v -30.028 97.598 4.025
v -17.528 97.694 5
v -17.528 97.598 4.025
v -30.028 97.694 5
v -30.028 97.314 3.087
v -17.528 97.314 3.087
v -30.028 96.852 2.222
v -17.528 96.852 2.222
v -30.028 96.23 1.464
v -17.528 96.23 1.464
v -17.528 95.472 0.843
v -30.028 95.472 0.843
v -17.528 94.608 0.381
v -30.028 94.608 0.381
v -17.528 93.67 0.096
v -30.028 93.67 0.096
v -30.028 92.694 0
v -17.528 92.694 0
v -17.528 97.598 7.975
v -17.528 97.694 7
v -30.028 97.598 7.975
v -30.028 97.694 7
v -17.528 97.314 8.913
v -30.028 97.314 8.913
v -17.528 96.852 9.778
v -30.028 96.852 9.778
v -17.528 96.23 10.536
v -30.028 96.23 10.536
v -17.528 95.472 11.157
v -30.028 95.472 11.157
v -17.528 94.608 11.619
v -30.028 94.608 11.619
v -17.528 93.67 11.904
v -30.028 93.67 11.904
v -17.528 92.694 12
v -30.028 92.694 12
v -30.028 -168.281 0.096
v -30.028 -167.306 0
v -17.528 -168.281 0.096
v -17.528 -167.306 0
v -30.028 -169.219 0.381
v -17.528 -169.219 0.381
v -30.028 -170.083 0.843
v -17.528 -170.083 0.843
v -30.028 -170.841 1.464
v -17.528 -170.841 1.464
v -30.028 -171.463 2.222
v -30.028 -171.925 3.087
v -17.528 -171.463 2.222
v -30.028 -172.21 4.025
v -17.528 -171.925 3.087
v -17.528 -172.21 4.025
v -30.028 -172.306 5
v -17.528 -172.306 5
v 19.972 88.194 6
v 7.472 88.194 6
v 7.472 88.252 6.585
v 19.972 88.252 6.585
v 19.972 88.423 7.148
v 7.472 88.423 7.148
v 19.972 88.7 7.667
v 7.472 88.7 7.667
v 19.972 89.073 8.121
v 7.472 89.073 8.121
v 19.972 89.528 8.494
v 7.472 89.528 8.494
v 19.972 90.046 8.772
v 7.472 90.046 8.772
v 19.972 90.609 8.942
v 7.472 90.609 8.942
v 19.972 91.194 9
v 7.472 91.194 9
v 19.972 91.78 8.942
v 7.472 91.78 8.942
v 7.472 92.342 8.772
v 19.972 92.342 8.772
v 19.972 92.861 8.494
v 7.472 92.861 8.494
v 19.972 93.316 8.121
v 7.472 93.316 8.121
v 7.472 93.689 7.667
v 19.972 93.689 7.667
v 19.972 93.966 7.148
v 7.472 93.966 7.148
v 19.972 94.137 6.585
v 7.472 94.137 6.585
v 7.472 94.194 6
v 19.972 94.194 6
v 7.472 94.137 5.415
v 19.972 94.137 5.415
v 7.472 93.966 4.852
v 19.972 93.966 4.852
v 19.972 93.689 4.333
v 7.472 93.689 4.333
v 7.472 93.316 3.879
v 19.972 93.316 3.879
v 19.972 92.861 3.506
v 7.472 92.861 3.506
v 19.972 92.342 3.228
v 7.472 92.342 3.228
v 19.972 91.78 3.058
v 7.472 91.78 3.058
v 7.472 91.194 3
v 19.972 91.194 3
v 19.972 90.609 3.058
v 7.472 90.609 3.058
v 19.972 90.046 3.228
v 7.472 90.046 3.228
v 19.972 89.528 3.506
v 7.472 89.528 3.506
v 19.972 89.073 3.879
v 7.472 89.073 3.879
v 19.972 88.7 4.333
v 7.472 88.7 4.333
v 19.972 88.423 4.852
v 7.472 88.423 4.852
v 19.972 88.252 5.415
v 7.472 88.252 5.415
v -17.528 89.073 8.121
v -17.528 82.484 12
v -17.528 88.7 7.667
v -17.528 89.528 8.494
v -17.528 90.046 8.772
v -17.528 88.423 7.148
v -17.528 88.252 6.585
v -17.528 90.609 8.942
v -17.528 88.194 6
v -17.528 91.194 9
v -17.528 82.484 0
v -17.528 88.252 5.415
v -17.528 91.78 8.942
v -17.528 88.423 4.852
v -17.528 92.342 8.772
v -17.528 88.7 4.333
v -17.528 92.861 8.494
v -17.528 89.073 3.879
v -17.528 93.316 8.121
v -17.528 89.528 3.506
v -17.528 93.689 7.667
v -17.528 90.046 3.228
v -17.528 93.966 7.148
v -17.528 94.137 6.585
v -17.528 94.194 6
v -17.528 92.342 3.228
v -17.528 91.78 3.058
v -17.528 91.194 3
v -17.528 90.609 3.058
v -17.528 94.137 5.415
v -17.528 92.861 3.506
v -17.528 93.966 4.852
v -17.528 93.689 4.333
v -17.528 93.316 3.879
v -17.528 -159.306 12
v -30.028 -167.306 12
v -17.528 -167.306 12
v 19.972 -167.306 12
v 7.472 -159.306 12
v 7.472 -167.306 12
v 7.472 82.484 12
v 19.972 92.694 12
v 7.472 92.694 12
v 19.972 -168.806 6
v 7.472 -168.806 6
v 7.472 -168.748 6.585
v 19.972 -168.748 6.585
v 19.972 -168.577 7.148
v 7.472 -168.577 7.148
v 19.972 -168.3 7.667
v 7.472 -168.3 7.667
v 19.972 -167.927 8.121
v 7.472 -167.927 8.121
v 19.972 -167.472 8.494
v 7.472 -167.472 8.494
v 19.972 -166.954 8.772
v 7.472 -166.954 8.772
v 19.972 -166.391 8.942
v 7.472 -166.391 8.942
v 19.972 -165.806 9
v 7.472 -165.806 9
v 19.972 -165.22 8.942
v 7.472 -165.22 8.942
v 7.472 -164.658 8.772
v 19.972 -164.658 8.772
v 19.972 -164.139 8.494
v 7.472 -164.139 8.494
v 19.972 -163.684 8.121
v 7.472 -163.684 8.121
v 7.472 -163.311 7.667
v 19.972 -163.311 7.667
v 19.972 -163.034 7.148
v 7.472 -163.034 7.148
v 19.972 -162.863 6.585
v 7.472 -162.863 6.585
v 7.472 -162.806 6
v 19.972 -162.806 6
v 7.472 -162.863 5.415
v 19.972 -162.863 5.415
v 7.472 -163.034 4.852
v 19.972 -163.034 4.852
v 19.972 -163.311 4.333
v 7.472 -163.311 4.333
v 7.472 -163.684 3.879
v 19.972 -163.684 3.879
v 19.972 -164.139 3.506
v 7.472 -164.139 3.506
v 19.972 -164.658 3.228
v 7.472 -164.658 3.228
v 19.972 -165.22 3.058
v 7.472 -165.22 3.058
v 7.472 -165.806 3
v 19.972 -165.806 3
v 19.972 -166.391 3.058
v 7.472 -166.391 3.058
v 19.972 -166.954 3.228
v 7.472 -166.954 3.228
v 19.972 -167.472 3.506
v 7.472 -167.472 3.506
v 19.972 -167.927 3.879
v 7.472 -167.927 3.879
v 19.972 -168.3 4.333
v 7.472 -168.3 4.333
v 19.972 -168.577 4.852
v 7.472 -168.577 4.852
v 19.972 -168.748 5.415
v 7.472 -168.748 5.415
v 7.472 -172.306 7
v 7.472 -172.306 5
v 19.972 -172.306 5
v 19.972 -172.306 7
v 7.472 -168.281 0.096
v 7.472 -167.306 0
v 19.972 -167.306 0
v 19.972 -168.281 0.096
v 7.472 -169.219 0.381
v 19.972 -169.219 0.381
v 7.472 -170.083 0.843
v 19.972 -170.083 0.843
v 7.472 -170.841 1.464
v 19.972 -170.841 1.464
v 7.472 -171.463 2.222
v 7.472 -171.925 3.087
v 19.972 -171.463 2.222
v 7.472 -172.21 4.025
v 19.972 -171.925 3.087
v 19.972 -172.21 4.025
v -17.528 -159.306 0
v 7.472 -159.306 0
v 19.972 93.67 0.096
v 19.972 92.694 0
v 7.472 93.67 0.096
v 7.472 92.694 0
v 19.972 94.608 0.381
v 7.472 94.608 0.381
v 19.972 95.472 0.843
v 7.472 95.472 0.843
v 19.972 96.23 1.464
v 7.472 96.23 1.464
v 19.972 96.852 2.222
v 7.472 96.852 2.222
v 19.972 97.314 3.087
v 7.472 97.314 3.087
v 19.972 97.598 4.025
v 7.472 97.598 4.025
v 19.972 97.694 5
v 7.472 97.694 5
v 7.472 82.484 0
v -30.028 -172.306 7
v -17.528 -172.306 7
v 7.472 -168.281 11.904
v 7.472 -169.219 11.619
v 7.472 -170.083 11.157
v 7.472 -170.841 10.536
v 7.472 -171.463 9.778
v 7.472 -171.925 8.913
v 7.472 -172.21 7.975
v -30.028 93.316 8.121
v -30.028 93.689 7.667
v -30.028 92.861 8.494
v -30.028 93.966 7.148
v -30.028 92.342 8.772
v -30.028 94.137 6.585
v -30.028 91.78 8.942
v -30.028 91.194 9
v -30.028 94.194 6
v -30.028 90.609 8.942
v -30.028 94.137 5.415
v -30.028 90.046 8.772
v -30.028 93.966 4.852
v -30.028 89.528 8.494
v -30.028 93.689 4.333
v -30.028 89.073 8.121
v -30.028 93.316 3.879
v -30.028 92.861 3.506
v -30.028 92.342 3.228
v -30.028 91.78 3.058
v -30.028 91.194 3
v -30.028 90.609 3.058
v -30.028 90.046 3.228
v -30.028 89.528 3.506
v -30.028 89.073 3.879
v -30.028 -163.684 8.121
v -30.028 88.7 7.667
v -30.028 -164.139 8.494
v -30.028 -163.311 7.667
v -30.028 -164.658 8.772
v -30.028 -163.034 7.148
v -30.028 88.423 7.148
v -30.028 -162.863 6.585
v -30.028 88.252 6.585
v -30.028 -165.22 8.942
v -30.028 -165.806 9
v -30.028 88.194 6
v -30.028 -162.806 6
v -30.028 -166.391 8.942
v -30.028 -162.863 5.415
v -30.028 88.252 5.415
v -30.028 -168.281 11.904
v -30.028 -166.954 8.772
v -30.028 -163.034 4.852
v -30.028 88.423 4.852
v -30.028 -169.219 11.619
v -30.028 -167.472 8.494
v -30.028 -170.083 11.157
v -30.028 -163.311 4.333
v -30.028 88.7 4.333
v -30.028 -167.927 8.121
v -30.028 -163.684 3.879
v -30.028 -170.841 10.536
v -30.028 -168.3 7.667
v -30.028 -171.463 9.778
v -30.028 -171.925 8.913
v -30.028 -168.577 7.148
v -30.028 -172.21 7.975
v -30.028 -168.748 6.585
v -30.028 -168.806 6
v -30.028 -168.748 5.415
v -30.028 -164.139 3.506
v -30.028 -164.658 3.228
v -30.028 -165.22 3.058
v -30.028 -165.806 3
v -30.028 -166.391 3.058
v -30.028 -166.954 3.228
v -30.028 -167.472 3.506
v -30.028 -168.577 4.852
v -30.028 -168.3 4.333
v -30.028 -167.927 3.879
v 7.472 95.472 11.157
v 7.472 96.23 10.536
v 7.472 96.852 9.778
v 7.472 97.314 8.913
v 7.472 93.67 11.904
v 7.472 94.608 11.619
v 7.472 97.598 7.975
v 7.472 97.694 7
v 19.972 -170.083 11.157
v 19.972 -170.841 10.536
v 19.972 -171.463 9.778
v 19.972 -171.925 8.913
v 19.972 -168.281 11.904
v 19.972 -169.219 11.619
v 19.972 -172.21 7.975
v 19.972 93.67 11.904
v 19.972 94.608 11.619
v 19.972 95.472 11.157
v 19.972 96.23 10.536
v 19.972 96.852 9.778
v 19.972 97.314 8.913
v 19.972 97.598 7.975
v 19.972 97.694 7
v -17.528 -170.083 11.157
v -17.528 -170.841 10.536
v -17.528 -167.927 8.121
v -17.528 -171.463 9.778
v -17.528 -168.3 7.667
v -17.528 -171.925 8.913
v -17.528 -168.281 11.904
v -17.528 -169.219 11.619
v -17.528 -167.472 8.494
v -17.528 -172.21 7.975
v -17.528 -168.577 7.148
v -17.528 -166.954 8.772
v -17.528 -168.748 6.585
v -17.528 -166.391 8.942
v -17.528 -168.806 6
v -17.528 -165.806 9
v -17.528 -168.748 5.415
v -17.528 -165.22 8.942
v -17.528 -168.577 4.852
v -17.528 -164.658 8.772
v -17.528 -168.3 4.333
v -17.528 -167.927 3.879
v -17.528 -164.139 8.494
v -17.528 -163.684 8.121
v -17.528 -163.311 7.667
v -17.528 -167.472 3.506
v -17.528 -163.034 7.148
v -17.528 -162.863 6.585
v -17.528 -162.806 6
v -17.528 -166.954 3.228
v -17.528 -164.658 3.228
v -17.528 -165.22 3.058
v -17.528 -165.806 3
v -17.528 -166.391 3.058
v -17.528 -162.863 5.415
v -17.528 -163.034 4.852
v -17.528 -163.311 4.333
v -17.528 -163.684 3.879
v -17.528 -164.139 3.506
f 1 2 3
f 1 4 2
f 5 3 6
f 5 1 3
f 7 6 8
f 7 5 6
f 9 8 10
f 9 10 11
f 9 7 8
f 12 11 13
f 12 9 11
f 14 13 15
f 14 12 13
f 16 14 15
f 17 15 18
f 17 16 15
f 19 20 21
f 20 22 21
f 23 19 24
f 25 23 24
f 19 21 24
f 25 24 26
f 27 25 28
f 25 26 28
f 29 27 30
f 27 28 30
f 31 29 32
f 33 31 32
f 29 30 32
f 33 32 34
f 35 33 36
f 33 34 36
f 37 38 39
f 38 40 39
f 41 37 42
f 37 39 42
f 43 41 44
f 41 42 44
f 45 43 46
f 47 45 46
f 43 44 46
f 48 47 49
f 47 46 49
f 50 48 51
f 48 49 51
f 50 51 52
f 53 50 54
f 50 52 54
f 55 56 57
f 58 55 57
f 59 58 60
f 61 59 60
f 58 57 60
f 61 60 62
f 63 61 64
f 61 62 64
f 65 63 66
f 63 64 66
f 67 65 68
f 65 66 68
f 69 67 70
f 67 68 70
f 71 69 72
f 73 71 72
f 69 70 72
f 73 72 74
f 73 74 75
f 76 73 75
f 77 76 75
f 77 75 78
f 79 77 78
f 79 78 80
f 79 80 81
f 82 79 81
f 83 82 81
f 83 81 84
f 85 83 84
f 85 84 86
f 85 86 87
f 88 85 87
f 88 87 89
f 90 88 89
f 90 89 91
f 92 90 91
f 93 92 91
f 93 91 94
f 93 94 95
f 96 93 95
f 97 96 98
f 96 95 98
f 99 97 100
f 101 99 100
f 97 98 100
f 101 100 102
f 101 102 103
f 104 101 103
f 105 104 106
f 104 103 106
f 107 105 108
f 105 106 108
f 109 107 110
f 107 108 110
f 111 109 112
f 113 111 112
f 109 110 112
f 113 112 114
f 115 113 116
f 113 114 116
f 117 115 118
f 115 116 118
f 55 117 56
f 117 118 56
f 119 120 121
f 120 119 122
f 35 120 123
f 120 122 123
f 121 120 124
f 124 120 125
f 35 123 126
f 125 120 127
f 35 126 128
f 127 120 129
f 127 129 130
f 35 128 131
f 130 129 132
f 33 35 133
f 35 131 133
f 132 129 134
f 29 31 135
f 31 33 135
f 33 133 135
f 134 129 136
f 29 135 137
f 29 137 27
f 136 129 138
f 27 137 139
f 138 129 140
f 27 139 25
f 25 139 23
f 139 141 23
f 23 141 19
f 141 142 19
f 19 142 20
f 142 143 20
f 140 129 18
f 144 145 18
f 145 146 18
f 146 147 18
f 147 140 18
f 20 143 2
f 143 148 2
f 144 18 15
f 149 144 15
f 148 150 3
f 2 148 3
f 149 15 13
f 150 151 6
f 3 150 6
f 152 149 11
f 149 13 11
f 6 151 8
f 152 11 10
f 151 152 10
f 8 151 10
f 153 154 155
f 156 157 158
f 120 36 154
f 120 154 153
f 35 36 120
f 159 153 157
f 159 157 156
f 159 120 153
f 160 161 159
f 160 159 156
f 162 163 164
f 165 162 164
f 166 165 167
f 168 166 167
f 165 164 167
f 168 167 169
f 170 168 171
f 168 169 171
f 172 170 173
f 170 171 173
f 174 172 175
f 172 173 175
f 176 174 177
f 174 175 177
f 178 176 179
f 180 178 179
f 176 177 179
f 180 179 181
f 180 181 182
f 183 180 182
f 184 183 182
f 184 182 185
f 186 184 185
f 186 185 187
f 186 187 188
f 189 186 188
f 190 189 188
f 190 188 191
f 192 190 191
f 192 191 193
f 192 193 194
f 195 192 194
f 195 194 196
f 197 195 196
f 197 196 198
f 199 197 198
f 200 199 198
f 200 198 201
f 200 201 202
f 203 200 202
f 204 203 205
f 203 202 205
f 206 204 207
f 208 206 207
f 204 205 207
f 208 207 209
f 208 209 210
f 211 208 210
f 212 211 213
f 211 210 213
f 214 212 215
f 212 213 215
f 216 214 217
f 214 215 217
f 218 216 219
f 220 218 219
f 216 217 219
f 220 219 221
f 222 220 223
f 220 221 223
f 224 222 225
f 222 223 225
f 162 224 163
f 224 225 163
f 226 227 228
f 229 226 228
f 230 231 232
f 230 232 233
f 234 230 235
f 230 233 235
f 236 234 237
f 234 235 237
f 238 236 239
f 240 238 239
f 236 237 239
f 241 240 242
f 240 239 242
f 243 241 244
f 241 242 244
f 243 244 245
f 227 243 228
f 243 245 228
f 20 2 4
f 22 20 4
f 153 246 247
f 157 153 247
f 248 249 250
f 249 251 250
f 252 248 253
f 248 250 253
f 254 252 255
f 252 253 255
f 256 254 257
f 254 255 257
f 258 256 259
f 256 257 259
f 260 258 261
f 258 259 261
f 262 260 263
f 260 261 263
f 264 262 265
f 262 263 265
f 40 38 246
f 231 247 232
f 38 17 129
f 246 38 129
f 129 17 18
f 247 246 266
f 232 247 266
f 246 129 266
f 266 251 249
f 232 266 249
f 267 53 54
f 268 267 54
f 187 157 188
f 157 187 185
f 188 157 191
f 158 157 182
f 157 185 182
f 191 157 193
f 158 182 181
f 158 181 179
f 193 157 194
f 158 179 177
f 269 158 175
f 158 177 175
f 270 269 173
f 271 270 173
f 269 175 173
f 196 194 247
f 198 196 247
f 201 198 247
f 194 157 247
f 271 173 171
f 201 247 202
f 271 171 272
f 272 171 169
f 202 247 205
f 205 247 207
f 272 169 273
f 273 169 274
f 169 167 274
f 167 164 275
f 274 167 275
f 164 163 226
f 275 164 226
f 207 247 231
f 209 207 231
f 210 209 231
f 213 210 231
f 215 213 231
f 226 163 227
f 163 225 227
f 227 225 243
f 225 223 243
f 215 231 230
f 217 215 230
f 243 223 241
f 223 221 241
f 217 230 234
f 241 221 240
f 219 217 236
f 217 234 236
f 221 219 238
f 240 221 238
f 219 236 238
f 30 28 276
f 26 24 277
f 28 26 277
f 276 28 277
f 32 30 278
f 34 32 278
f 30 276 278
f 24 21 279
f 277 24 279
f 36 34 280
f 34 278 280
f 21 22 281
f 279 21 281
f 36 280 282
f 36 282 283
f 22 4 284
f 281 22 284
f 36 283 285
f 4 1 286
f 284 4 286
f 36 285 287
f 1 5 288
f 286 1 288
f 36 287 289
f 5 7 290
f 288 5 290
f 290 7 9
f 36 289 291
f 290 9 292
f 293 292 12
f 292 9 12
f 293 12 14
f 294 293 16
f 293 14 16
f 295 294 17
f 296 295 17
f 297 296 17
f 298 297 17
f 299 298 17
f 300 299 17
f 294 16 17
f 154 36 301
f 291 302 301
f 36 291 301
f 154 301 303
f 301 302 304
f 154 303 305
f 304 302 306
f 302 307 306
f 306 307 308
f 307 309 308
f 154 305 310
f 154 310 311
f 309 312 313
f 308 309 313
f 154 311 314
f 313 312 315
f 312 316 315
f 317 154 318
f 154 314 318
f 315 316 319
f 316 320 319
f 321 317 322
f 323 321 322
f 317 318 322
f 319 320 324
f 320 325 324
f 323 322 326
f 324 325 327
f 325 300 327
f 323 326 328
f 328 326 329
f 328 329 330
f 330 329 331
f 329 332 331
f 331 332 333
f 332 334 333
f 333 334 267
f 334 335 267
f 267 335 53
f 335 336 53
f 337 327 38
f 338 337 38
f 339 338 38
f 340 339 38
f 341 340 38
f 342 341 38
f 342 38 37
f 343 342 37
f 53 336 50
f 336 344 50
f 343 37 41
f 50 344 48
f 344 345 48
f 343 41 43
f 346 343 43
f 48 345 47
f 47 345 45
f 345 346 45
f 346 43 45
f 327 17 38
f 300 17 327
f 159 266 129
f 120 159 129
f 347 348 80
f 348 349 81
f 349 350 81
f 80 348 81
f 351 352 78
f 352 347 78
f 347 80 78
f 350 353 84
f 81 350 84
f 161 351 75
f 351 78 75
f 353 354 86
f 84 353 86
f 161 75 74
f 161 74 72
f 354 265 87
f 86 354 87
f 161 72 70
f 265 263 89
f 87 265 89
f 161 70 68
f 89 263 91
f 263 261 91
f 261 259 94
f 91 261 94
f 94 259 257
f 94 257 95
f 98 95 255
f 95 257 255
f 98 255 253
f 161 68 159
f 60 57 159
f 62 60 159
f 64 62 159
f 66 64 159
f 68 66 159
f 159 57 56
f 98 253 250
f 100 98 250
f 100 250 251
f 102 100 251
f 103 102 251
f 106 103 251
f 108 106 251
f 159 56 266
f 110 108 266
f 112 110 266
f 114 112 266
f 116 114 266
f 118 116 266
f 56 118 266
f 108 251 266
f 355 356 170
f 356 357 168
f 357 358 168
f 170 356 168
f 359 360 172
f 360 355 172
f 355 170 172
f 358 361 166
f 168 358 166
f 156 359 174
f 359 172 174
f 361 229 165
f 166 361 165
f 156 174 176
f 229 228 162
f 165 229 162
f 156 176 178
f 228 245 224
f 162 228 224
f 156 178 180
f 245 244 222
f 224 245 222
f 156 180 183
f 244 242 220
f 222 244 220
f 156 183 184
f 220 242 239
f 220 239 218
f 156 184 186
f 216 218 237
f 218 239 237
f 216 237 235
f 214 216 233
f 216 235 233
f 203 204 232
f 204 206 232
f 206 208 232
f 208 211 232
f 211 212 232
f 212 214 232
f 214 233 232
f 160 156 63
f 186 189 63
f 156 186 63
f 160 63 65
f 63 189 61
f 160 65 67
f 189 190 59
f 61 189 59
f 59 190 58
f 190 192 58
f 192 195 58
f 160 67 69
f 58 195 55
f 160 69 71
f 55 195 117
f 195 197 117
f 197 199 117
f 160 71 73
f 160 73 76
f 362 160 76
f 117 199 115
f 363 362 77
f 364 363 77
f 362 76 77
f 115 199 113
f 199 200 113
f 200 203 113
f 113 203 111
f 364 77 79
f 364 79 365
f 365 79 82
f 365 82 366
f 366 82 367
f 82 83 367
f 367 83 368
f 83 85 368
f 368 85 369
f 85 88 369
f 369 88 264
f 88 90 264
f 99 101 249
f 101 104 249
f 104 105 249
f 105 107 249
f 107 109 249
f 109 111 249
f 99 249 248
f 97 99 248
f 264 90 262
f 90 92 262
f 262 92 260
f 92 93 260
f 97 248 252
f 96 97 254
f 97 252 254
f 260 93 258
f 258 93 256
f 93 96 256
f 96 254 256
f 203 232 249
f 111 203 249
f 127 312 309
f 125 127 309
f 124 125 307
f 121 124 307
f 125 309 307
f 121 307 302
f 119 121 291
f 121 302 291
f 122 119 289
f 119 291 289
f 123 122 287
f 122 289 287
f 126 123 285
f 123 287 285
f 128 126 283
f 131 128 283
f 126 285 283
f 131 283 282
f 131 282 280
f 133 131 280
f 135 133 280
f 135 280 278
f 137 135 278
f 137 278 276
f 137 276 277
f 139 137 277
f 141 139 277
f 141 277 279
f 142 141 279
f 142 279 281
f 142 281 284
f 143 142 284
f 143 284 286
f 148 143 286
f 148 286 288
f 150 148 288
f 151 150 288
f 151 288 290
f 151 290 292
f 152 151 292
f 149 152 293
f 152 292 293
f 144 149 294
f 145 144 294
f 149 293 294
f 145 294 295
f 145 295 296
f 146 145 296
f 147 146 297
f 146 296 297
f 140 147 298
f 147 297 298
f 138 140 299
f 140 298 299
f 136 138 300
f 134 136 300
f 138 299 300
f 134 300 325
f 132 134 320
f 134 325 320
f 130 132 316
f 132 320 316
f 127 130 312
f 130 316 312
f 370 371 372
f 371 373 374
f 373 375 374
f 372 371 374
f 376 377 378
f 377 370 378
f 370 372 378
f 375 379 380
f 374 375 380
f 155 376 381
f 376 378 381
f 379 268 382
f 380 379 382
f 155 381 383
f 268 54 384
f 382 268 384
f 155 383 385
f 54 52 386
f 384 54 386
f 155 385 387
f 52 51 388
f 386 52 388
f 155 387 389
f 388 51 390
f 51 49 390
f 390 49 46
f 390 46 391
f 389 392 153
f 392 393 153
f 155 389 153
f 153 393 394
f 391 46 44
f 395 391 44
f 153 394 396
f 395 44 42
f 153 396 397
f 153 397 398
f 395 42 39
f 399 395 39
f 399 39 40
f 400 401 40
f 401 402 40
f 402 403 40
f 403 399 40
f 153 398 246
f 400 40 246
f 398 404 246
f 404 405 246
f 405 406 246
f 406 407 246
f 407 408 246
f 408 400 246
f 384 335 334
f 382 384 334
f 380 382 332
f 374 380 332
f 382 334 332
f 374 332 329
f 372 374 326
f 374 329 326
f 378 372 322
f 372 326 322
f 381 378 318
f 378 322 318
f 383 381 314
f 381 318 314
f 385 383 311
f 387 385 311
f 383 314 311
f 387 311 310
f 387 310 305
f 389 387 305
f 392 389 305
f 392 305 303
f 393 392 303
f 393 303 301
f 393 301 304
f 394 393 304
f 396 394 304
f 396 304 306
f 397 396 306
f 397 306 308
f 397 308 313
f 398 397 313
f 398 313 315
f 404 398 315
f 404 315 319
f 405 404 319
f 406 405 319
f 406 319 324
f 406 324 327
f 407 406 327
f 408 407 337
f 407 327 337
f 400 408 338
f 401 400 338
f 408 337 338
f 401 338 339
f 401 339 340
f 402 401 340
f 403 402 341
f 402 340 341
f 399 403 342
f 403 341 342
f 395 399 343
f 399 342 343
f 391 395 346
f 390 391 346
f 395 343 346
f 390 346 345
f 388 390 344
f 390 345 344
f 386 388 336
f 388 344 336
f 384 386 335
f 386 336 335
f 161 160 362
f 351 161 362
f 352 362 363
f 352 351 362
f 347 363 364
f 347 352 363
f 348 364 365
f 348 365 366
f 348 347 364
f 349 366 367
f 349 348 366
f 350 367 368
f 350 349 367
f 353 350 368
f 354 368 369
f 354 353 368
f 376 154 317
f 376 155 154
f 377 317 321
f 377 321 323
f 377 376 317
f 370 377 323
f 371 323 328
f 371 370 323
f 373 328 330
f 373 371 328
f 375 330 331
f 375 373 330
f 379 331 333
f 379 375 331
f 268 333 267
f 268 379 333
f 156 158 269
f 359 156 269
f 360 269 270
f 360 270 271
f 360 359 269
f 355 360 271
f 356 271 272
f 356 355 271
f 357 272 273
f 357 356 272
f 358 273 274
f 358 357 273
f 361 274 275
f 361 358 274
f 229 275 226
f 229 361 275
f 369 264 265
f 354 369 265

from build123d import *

# Parameters (mm, degrees)
F1_DEPTH = 12
F2_R     = 3
F3_DEPTH = 50.001
F4_R     = 5


with BuildPart() as f1:
    # F0 (on Top) → F1 (new body)
    with BuildSketch(Plane.XY):
        Polygon((-17.527781, 97.694382), (-30.027781, 97.694382), (-30.027781, -172.305618), (-17.527781, -172.305618), (-17.527781, -159.305618), (7.472219, -159.305618), (7.472219, -172.305618), (19.972219, -172.305618), (19.972219, 97.694382), (7.472219, 97.694382), (7.472219, 82.484039), (-17.527781, 82.484039), align=None)
    extrude(amount=F1_DEPTH)

    # F2 (on face) → F3 (cut, through all)
    with BuildSketch(Plane(origin=(-30.027781, 0, 0), x_dir=(0, -1, 0), z_dir=(-1, 0, 0))):
        with Locations((-91.194382, 6)):
            Circle(F2_R)
        with Locations((165.805618, 6)):
            Circle(F2_R)
    extrude(amount=-F3_DEPTH, mode=Mode.SUBTRACT)

    # F4
    f4_edges = [f1.edges().sort_by_distance(p)[0] for p in [
        (-23.777781, 97.694382, 12),
        (-23.777781, 97.694382, 0),
        (13.722219, 97.694382, 12),
        (13.722219, 97.694382, 0),
        (-23.777781, -172.305618, 12),
        (13.722219, -172.305618, 12),
        (-23.777781, -172.305618, 0),
        (13.722219, -172.305618, 0),
    ]]
    fillet(f4_edges, radius=F4_R)


solid = f1.part
